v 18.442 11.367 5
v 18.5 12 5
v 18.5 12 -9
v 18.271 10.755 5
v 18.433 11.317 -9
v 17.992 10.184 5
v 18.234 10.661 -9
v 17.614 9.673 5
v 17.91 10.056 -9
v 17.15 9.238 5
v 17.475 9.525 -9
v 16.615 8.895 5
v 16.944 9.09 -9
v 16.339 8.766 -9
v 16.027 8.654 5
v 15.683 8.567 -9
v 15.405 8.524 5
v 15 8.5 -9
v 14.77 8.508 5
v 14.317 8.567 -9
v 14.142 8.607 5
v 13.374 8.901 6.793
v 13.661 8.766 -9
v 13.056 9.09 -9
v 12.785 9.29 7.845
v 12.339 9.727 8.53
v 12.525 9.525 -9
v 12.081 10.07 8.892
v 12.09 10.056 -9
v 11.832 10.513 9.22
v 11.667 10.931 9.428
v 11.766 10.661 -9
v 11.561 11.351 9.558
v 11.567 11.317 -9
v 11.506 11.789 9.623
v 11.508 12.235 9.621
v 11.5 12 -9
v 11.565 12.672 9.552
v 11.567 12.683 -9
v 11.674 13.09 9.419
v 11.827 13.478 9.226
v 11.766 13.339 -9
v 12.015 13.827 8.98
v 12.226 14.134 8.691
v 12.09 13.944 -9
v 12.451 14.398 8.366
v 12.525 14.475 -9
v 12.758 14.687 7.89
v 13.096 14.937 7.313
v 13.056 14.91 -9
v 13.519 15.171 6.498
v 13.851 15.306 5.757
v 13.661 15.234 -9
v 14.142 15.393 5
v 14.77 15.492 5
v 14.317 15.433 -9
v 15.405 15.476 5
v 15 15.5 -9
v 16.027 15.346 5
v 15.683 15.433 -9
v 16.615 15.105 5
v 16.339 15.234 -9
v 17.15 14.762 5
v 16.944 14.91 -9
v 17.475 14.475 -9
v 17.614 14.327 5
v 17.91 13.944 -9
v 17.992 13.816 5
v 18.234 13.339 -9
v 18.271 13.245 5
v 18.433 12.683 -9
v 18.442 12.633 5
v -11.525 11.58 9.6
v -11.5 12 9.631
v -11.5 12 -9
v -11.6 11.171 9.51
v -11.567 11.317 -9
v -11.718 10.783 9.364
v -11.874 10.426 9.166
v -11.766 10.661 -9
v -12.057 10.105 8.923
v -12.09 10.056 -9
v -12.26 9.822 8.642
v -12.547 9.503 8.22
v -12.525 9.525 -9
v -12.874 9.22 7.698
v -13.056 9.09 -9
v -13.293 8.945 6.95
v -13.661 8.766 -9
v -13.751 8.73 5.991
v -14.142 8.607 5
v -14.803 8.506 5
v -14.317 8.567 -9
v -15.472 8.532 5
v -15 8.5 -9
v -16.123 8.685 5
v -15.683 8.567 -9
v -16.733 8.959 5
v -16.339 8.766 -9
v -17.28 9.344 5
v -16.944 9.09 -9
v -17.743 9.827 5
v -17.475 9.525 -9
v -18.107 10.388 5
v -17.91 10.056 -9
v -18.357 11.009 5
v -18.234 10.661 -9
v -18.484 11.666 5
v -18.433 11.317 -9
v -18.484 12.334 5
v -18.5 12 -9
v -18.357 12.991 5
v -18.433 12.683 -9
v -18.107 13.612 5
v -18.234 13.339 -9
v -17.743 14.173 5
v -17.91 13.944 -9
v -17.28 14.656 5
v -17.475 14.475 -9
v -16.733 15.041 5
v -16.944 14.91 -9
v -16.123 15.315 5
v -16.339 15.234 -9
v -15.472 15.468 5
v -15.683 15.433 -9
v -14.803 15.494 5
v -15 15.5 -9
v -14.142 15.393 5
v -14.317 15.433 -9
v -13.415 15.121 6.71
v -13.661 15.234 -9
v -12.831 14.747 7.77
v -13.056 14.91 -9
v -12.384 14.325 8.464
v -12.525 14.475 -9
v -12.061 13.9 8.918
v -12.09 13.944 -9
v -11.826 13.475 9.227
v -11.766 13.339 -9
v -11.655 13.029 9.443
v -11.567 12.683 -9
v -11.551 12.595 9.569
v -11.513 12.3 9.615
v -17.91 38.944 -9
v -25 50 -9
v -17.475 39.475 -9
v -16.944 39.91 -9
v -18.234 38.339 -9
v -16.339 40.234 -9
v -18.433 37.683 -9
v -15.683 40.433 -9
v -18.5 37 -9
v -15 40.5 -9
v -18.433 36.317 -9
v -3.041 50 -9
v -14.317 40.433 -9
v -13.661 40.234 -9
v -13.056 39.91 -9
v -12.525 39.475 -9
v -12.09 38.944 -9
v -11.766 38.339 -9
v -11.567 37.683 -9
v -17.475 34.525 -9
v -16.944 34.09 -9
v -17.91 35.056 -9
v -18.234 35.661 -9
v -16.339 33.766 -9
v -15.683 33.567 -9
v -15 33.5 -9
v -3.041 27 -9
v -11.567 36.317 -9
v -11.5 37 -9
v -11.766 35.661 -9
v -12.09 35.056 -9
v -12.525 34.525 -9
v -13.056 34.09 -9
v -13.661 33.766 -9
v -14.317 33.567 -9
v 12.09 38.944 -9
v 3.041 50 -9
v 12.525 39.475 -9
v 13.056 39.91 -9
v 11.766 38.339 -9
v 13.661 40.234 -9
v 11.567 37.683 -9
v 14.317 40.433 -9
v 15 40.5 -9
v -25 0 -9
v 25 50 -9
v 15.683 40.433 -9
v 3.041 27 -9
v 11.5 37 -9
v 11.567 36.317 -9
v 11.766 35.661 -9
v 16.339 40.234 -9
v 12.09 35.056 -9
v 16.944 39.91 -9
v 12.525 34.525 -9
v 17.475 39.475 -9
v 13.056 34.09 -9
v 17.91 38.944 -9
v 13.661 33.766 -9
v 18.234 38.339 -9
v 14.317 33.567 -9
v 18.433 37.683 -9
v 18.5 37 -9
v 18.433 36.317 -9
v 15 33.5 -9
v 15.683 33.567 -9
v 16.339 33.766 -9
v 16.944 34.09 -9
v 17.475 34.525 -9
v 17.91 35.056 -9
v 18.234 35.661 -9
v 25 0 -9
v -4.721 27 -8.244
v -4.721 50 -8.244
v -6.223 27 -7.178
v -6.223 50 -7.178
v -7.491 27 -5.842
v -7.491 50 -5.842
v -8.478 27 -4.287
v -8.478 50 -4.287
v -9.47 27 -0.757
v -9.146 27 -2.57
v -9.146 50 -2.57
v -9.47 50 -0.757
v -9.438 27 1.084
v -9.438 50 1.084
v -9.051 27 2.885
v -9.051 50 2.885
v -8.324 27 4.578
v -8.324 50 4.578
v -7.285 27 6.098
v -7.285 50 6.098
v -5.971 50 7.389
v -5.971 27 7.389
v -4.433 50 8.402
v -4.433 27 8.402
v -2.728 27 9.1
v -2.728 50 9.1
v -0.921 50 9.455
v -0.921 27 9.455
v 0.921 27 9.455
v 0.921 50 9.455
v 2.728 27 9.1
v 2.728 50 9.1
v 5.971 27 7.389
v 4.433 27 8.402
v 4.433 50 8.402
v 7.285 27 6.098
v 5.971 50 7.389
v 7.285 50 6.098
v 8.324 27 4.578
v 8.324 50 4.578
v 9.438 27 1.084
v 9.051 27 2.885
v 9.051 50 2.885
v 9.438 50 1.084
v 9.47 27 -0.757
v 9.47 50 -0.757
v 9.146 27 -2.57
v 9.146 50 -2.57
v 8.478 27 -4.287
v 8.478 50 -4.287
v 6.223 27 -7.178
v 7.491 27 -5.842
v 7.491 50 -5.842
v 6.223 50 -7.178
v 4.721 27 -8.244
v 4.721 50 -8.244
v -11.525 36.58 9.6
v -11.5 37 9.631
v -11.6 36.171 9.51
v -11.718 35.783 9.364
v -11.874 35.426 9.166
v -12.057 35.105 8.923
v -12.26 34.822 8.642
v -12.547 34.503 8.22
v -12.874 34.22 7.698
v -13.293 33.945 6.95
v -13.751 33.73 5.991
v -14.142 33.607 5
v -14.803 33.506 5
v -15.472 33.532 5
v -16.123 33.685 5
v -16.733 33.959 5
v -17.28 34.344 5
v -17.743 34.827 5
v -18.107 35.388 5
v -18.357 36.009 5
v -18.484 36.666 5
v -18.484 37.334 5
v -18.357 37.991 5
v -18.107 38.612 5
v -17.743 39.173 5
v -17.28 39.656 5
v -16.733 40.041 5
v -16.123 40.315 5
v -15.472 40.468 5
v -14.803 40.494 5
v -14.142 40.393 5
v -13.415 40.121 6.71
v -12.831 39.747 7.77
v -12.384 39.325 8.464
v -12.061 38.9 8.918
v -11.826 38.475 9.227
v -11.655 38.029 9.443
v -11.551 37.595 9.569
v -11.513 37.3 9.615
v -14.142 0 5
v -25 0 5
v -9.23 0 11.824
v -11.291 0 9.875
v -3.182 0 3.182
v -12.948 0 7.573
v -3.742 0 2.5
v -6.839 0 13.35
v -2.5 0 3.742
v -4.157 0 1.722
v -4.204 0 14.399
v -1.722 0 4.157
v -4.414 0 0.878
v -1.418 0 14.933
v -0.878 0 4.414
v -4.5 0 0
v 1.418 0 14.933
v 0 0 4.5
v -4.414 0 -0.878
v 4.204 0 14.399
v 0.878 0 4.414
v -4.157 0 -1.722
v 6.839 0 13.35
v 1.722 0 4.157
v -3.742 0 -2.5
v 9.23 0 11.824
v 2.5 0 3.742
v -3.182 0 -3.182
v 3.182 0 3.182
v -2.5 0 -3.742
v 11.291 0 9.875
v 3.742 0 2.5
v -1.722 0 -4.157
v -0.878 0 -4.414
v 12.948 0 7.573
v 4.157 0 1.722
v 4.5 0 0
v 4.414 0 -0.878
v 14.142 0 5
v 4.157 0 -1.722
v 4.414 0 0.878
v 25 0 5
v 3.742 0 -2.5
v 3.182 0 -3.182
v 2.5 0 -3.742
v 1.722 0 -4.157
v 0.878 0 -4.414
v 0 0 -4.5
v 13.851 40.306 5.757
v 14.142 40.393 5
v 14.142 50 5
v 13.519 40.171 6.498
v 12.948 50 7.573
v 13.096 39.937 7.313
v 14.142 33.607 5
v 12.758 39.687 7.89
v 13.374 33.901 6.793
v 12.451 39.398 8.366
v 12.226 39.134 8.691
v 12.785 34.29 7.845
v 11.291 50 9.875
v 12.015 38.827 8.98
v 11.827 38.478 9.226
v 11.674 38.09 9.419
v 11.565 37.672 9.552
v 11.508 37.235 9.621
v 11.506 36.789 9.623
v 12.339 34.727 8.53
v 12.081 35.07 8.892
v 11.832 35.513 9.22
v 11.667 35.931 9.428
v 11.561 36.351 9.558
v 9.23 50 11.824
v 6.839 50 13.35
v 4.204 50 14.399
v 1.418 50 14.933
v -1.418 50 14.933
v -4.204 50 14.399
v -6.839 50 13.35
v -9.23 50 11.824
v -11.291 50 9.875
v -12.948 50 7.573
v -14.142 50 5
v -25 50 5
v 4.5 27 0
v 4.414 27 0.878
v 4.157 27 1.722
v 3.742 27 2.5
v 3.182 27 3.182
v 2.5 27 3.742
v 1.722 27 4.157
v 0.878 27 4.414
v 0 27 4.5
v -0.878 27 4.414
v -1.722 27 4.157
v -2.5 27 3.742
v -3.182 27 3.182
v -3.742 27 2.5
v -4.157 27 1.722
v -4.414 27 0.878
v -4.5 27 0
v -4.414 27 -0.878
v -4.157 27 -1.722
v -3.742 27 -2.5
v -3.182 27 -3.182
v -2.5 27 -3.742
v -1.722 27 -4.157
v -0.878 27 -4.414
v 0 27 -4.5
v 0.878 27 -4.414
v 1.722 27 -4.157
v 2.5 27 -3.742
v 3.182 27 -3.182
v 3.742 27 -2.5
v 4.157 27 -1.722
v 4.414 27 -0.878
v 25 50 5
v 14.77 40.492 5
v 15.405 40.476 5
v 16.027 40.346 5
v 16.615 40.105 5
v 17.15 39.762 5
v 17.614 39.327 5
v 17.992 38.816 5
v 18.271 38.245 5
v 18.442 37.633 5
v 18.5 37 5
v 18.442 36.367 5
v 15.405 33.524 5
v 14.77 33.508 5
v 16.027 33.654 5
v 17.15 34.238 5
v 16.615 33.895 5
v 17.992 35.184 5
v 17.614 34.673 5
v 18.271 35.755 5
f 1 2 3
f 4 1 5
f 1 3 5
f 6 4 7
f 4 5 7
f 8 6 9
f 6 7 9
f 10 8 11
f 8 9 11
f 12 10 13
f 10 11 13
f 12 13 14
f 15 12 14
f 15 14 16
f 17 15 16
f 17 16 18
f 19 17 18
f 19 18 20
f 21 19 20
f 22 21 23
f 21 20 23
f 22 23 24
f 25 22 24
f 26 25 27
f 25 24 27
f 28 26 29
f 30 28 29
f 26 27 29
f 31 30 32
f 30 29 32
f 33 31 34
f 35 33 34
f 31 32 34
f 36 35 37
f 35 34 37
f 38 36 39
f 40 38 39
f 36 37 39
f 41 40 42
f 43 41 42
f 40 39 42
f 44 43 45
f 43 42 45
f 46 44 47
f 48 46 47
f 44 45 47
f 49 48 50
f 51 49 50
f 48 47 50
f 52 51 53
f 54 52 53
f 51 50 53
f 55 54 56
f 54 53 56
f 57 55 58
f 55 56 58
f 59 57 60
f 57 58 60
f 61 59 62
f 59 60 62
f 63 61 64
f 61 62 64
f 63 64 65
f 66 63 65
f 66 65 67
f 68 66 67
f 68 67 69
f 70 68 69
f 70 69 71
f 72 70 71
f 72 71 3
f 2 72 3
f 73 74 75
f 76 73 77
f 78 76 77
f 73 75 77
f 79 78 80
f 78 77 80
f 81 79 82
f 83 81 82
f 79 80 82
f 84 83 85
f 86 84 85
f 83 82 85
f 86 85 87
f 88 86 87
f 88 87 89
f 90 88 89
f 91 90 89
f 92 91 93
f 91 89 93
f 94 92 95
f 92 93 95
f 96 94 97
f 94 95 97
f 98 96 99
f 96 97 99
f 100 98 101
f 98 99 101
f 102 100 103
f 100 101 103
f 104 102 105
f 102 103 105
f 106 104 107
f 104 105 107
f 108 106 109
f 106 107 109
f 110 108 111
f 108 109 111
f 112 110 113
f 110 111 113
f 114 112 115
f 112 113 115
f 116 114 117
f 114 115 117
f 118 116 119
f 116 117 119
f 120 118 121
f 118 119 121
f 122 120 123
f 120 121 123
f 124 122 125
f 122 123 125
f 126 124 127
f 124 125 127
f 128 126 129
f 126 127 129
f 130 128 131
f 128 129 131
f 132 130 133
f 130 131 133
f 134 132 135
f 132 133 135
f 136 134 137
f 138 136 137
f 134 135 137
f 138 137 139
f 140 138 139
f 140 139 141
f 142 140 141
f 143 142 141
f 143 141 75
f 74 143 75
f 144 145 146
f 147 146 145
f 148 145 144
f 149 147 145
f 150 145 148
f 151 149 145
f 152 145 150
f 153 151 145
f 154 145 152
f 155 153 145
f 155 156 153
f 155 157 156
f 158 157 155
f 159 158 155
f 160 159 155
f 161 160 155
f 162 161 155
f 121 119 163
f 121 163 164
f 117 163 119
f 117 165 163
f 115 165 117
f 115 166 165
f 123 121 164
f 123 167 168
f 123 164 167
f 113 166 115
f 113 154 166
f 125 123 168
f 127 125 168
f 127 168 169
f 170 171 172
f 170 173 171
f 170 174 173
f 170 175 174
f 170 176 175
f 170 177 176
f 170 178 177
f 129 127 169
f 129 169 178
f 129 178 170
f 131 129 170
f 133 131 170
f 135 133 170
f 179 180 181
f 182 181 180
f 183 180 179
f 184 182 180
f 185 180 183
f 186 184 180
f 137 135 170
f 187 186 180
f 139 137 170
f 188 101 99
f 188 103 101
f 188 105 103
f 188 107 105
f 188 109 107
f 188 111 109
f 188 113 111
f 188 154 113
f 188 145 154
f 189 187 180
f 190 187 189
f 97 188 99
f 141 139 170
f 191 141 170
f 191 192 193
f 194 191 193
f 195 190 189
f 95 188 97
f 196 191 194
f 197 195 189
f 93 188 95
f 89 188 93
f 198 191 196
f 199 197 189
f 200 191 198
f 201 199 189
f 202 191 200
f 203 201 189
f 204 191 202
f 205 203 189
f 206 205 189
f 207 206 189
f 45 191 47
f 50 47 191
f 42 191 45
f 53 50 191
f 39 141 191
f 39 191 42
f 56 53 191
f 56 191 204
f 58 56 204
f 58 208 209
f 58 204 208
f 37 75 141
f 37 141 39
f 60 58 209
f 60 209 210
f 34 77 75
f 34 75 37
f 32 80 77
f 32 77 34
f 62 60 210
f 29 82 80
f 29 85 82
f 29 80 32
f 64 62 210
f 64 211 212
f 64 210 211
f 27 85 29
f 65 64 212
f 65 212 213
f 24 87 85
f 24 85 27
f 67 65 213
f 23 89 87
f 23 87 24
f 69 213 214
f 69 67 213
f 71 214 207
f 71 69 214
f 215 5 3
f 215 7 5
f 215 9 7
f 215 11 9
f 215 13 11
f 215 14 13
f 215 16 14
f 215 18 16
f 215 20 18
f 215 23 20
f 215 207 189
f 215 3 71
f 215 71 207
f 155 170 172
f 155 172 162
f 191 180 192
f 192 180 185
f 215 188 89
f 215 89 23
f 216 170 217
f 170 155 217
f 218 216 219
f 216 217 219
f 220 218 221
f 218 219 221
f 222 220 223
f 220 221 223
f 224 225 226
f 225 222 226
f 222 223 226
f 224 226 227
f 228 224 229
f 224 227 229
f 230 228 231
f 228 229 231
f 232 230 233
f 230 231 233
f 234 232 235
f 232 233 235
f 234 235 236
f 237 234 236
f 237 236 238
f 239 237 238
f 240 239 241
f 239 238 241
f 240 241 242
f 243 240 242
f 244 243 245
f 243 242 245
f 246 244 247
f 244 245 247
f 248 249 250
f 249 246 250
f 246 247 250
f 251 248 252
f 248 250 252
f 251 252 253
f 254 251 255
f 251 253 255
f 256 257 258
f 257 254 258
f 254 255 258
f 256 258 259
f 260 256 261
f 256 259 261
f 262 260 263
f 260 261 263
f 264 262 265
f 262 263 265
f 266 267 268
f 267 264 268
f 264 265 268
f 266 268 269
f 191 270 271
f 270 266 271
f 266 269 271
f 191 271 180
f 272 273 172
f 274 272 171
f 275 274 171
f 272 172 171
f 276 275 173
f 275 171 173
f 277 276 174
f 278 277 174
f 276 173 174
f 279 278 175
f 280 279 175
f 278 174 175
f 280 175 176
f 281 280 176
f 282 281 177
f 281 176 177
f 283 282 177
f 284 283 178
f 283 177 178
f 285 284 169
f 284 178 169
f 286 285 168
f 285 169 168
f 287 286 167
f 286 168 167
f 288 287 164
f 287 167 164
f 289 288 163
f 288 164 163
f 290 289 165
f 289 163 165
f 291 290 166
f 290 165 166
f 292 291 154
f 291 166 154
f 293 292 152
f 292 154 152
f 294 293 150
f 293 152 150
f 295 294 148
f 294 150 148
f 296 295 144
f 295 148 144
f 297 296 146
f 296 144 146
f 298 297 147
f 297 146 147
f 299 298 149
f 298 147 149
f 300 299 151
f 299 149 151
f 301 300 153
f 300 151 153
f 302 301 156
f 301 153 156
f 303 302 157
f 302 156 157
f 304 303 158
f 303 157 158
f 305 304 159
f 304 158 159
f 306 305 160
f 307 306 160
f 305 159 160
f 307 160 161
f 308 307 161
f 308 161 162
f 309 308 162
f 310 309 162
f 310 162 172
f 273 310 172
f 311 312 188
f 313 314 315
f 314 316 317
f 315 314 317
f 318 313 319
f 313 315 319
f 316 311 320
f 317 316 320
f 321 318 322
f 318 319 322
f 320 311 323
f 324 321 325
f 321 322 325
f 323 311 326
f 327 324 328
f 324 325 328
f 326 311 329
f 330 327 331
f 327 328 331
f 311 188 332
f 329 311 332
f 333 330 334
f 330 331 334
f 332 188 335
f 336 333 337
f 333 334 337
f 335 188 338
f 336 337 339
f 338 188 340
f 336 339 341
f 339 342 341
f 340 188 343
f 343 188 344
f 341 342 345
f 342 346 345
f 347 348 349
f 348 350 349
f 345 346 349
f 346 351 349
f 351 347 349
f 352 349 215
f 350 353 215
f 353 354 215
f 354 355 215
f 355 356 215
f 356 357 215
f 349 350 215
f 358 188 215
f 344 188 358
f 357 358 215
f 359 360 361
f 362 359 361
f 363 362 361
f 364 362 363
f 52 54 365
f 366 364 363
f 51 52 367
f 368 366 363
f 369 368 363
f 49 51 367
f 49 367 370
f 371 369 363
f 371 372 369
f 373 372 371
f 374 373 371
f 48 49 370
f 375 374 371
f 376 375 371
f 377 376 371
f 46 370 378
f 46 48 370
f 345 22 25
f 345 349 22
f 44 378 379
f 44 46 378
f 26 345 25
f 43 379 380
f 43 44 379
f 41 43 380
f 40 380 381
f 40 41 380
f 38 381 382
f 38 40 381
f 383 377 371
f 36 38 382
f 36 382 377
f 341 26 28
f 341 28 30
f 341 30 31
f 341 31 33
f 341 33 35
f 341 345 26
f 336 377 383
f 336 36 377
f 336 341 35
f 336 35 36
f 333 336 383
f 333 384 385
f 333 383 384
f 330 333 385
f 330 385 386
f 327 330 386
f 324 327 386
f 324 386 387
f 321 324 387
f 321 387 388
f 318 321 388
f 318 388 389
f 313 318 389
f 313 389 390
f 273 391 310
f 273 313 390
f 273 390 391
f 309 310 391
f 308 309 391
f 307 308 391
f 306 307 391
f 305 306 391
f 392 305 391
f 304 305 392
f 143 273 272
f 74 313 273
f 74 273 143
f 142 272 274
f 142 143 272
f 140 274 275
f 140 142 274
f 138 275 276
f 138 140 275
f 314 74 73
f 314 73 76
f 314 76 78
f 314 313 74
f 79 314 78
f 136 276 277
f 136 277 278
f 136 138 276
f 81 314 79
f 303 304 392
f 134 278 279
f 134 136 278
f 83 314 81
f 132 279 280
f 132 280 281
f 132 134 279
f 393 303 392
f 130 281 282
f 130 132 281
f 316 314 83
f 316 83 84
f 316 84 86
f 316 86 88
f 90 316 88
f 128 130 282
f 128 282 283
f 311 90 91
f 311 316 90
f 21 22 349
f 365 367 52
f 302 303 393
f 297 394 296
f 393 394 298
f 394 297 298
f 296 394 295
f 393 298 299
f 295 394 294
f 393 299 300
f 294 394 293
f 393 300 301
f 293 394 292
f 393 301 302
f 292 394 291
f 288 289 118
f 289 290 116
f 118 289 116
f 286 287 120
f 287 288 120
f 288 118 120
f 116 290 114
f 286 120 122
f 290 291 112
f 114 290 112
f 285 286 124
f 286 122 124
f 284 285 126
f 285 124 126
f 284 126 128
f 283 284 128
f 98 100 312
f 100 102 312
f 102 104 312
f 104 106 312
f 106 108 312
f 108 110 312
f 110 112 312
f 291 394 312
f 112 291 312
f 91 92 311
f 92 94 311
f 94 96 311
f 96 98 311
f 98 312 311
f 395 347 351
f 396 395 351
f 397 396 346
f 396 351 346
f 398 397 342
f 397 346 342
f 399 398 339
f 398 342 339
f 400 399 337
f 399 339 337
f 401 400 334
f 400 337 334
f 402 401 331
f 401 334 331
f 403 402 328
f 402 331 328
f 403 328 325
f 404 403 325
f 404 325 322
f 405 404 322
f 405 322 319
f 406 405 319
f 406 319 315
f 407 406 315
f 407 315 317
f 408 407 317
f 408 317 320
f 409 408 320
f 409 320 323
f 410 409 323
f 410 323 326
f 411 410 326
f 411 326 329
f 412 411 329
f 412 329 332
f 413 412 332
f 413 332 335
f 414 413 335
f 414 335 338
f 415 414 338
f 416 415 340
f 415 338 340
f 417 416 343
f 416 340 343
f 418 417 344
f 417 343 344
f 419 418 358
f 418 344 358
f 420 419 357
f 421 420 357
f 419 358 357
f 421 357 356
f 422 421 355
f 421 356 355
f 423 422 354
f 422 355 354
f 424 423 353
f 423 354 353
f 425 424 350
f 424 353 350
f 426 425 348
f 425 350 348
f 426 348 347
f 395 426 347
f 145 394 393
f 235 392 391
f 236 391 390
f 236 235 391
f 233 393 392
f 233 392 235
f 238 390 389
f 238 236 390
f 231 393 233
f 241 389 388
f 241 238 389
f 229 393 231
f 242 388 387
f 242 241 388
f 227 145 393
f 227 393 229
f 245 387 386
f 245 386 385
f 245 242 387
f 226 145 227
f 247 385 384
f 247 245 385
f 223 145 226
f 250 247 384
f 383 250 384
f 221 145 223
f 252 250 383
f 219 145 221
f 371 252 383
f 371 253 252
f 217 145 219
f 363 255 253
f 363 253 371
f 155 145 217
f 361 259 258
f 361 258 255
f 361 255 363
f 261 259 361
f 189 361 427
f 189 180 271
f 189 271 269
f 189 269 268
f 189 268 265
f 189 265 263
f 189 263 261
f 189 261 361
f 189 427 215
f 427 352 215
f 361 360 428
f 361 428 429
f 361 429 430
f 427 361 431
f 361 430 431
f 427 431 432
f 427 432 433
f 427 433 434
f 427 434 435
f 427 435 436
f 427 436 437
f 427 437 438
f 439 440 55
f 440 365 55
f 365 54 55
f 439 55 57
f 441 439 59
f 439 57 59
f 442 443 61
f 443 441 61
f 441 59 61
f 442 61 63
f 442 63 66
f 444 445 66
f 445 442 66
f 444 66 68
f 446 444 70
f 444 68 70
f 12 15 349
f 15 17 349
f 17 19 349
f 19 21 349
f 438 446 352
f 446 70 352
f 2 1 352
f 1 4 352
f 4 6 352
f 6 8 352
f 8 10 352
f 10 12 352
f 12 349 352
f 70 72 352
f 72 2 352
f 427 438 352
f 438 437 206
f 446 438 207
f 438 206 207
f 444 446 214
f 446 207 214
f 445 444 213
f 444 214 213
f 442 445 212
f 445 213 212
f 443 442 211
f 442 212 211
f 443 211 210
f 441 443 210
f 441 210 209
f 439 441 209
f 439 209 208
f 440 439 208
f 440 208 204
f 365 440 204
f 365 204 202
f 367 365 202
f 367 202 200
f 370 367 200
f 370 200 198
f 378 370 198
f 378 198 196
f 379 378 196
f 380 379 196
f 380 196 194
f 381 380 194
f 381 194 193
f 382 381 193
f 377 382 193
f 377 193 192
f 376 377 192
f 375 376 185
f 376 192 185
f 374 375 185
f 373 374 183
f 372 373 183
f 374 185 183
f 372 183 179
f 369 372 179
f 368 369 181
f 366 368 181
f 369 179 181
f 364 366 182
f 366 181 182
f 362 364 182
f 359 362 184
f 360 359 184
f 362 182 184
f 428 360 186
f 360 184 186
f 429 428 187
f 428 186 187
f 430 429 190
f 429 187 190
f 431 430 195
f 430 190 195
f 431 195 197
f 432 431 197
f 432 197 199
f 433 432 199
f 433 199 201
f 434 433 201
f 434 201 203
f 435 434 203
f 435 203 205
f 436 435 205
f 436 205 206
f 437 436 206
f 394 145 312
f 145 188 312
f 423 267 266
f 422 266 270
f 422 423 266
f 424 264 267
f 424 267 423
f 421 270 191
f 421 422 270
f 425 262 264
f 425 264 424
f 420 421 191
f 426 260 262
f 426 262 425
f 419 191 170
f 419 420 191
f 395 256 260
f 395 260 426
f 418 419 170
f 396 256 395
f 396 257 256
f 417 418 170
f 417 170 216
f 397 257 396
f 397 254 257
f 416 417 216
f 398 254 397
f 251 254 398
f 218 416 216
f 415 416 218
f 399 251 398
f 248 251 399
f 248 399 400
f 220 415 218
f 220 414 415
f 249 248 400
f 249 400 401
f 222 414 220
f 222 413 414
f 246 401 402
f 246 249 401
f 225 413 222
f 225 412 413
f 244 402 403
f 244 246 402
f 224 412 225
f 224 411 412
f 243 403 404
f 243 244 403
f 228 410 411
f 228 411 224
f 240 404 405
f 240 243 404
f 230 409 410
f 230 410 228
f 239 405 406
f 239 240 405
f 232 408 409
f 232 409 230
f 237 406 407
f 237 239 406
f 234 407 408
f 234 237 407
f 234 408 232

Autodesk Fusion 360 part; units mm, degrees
sketch "Sketch1" plane through (0, 0, 0) normal (0, 1, 0) x (1, 0, 0)
  circle A0 centre (0, 0) radius 15
  circle A1 centre (0, 0) radius 4.5
  line L0 (-12, 9) -> (12, 9)
  line L1 (-12, 9) -> (-25, 9)
  line L2 (-25, 9) -> (-25, -5)
  line L3 (-25, -5) -> (25, -5)
  line L4 (25, -5) -> (25, 9)
  line L5 (25, 9) -> (12, 9)
  dimension "d1" = 9
  dimension "d2" = 30
  dimension "d3" = 9
  dimension "d6" = 25
  dimension "d7" = 25
  dimension "d8" = 14
extrude "Extrude1" add sketch "Sketch1" along normal blind 50 contours A0 L0 L3 | A0 L3 L4 L5 | A0 L3 | A0 L1 L2 L3
sketch "Sketch2" plane through (0, 0, -9) normal (0, 0, -1) x (1, 0, 0)
  line L0 (25, 0) -> (-25, 0)
  line L1 (-25, 0) -> (-25, -50)
  line L2 (-25, -50) -> (25, -50)
  line L3 (25, -50) -> (25, 0)
  line L4 (0, 0) -> (0, -50)
  circle A0 centre (-15, -12) radius 3.5
  circle A1 centre (-15, -37) radius 3.5
  circle A2 centre (15, -12) radius 3.5
  circle A3 centre (15, -37) radius 3.5
  dimension "d9" = 15
  dimension "d10" = 15
  dimension "d11" = 25
  dimension "d12" = 12
  dimension "d13" = 7
  dimension "d14" = 7
sketch "Sketch3" plane through (0, 50, 0) normal (0, 1, 0) x (-1, 0, 0)
  circle A0 centre (0, 0) radius 4.5
  line L0 (-25, -9) -> (25, -9)
  line L1 (25, -9) -> (25, 5)
  line L2 (25, 5) -> (14.1421, 5)
  arc A1 (14.1421, 5) -> (-14.1421, 5) centre (0, 0) ccw
  line L3 (-14.1421, 5) -> (-25, 5)
  line L4 (-25, 5) -> (-25, -9)
  circle A2 centre (0, 0) radius 9.5
  dimension "d15" = 19
sketch "Sketch4" plane through (0, 0, 5) normal (0, 0, 1) x (-1, 0, 0)
  line L0 (-14.1421, -50) -> (-14.1421, 0)
  line L1 (-14.1421, 0) -> (-25, 0)
  line L2 (-25, 0) -> (-25, -50)
  line L3 (-25, -50) -> (-14.1421, -50)
  line L4 (0, 0) -> (0, -41)
  line L5 (-14.1421, -15) -> (-25, -15)
  line L6 (-25, -15) -> (-25, 0)
  line L7 (-25, 0) -> (-14.1421, 0)
  line L8 (-14.1421, 0) -> (-14.1421, -15)
  line L9 (14.1421, -15) -> (25, -15)
  line L10 (14.1421, 0) -> (14.1421, -15)
  line L11 (25, 0) -> (14.1421, 0)
  line L12 (25, -15) -> (25, 0)
  dimension "d20" = 15
extrude "Extrude3" cut sketch "Sketch2" against normal blind 26 contours A0 | A1 | A2 | A3
extrude "Extrude2" cut sketch "Sketch3" against normal blind 23 contours L0 A2 picked at (-0.1121, -7.4958)
extrude "Extrude4" [suppressed]
equation "d7 = d6"
equation "d10 = d9"
equation "d14 = d13"
